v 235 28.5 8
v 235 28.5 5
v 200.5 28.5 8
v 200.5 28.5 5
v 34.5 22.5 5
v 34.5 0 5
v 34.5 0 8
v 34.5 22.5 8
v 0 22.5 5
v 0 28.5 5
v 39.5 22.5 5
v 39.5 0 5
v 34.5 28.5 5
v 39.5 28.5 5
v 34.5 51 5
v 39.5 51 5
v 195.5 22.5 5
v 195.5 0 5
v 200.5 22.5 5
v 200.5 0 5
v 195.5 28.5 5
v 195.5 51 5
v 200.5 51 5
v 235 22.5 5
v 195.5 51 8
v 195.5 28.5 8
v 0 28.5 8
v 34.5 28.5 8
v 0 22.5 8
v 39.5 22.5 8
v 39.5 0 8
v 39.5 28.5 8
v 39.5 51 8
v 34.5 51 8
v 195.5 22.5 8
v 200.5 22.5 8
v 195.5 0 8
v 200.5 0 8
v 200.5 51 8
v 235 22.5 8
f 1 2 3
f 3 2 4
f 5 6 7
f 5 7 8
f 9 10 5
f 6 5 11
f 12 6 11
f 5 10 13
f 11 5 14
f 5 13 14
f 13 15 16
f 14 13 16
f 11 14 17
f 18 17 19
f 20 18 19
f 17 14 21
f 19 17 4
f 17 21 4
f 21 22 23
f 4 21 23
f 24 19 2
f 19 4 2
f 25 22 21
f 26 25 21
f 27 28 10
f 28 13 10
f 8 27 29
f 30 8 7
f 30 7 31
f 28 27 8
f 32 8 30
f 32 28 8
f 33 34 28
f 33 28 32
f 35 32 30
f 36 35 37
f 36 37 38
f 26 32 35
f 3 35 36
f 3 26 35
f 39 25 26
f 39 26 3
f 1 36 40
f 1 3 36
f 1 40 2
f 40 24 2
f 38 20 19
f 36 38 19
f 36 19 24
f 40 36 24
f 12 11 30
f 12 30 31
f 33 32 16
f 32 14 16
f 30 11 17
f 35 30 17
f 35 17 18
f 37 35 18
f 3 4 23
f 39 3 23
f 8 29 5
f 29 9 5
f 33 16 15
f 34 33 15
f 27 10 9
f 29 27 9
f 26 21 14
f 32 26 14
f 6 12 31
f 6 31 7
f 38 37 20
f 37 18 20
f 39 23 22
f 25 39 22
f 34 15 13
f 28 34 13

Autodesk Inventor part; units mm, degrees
ref_plane "Work Plane4" through (0, 0, 5) normal (0, 0, 1) x (1, 0, 0)
sketch "Sketch2" plane through (0, 0, 5) normal (0, 0, 1) x (1, 0, 0)
  line L0 (0, 0) -> (235, 0)
  line L1 (235, 0) -> (235, 51)
  line L2 (235, 51) -> (0, 51)
  line L3 (0, 51) -> (0, 0)
  line L4 (235, 0) -> (235, 51) projected
  line L5 (0, 22.5) -> (235, 22.5)
  line L6 (235, 22.5) -> (235, 28.5)
  line L7 (235, 28.5) -> (0, 28.5)
  line L8 (0, 28.5) -> (0, 22.5)
  line L9 (0, 22.5) -> (235, 28.5) construction
  line L10 (235, 22.5) -> (0, 28.5) construction
  point P0 (117.5, 25.5)
  dimension "d4" = 6
extrude "Extrusion2" add sketch "Sketch2" along normal blind 3 contours L3 L7 L1 L5
ref_plane "Work Plane8" through (0, 0, 5) normal (0, 0, 1) x (1, 0, 0)
sketch "Sketch3" plane through (0, 0, 5) normal (0, 0, 1) x (1, 0, 0)
  line L0 (0, 28.5) -> (235, 28.5) projected
  line L1 (235, 51) -> (0, 51) projected
  line L2 (34.5, 28.5) -> (39.5, 28.5)
  line L3 (39.5, 28.5) -> (39.5, 51)
  line L4 (39.5, 51) -> (34.5, 51)
  line L5 (34.5, 51) -> (34.5, 28.5)
  point P0 (0, 0)
  dimension "d7" = 5
ref_plane "Work Plane9" through (0, 0, 5) normal (0, 0, 1) x (1, 0, 0)
sketch "Sketch5" plane through (0, 0, 5) normal (0, 0, 1) x (1, 0, 0)
  line L0 (235, 51) -> (0, 51) projected
  line L1 (117.5, 51) -> (117.5, 0)
  line L2 (235, 28.5) -> (0, 28.5) projected
  line L3 (34.5, 51) -> (39.5, 51)
  line L4 (39.5, 51) -> (39.5, 28.5)
  line L5 (39.5, 28.5) -> (34.5, 28.5)
  line L6 (34.5, 28.5) -> (34.5, 51)
  line L7 (0, 22.5) -> (235, 22.5) projected
  line L8 (34.5, 22.5) -> (39.5, 22.5)
  line L9 (39.5, 22.5) -> (39.5, 0)
  line L10 (39.5, 0) -> (34.5, 0)
  line L11 (34.5, 0) -> (34.5, 22.5)
  line L12 (195.5, 51) -> (195.5, 28.5)
  line L13 (200.5, 28.5) -> (200.5, 51)
  line L14 (195.5, 22.5) -> (195.5, 0)
  line L15 (195.5, 0) -> (200.5, 0)
  line L16 (200.5, 0) -> (200.5, 22.5)
  line L17 (195.5, 28.5) -> (200.5, 28.5)
  line L18 (195.5, 22.5) -> (200.5, 22.5)
  line L19 (195.5, 51) -> (200.5, 51)
  point P0 (0, 0)
  dimension "d13" = 5
extrude "Extrusion5" add sketch "Sketch3" along normal blind 3
extrude "Extrusion6" add sketch "Sketch5" along normal blind 3 contours L9 L10 L11 L7
extrude "Extrusion7" add sketch "Sketch5" along normal blind 3 contours L13 L2 L12 L0 | L7 L16 L15 L14
sketch "Sketch7" plane through (0, 0, 8) normal (0, 0, 1) x (1, 0, 0)
  line L0 (0, 28.5) -> (34.5, 28.5)
  line L1 (34.5, 28.5) -> (34.5, 51)
  line L2 (34.5, 51) -> (39.5, 51)
  line L3 (39.5, 51) -> (39.5, 28.5)
  line L4 (39.5, 28.5) -> (39.5, 51) projected
  line L5 (39.5, 28.5) -> (195.5, 28.5)
  line L6 (195.5, 28.5) -> (195.5, 51)
  line L7 (195.5, 51) -> (195.5, 28.5) projected
  line L8 (195.5, 51) -> (185.7081, 51)
  line L9 (200.5, 51) -> (200.5, 28.5)
  line L10 (200.5, 28.5) -> (200.5, 51) projected
  line L11 (200.5, 28.5) -> (235, 28.5)
  line L12 (235, 28.5) -> (235, 22.5)
  line L13 (235, 22.5) -> (200.5, 22.5)
  line L14 (200.5, 22.5) -> (200.5, 0)
  line L15 (200.5, 0) -> (200.5, 22.5) projected
  line L16 (200.5, 0) -> (195.5, 0)
  line L17 (195.5, 0) -> (200.5, 0) projected
  line L18 (195.5, 0) -> (195.5, 22.5)
  line L19 (195.5, 22.5) -> (39.5, 22.5)
  line L20 (0, 22.5) -> (235, 22.5) projected
  line L21 (39.5, 22.5) -> (39.5, 0)
  line L22 (39.5, 0) -> (34.5, 0)
  line L23 (34.5, 0) -> (39.5, 0) projected
  line L24 (34.5, 0) -> (34.5, 22.5)
  line L25 (34.5, 22.5) -> (34.5, 0) projected
  line L26 (34.5, 22.5) -> (0, 22.5)
  line L27 (0, 22.5) -> (0, 28.5)
  line L28 (0, 28.5) -> (0, 22.5) projected
  point P0 (0, 0)
properties part number "Brace" material "ABS Plastic"
